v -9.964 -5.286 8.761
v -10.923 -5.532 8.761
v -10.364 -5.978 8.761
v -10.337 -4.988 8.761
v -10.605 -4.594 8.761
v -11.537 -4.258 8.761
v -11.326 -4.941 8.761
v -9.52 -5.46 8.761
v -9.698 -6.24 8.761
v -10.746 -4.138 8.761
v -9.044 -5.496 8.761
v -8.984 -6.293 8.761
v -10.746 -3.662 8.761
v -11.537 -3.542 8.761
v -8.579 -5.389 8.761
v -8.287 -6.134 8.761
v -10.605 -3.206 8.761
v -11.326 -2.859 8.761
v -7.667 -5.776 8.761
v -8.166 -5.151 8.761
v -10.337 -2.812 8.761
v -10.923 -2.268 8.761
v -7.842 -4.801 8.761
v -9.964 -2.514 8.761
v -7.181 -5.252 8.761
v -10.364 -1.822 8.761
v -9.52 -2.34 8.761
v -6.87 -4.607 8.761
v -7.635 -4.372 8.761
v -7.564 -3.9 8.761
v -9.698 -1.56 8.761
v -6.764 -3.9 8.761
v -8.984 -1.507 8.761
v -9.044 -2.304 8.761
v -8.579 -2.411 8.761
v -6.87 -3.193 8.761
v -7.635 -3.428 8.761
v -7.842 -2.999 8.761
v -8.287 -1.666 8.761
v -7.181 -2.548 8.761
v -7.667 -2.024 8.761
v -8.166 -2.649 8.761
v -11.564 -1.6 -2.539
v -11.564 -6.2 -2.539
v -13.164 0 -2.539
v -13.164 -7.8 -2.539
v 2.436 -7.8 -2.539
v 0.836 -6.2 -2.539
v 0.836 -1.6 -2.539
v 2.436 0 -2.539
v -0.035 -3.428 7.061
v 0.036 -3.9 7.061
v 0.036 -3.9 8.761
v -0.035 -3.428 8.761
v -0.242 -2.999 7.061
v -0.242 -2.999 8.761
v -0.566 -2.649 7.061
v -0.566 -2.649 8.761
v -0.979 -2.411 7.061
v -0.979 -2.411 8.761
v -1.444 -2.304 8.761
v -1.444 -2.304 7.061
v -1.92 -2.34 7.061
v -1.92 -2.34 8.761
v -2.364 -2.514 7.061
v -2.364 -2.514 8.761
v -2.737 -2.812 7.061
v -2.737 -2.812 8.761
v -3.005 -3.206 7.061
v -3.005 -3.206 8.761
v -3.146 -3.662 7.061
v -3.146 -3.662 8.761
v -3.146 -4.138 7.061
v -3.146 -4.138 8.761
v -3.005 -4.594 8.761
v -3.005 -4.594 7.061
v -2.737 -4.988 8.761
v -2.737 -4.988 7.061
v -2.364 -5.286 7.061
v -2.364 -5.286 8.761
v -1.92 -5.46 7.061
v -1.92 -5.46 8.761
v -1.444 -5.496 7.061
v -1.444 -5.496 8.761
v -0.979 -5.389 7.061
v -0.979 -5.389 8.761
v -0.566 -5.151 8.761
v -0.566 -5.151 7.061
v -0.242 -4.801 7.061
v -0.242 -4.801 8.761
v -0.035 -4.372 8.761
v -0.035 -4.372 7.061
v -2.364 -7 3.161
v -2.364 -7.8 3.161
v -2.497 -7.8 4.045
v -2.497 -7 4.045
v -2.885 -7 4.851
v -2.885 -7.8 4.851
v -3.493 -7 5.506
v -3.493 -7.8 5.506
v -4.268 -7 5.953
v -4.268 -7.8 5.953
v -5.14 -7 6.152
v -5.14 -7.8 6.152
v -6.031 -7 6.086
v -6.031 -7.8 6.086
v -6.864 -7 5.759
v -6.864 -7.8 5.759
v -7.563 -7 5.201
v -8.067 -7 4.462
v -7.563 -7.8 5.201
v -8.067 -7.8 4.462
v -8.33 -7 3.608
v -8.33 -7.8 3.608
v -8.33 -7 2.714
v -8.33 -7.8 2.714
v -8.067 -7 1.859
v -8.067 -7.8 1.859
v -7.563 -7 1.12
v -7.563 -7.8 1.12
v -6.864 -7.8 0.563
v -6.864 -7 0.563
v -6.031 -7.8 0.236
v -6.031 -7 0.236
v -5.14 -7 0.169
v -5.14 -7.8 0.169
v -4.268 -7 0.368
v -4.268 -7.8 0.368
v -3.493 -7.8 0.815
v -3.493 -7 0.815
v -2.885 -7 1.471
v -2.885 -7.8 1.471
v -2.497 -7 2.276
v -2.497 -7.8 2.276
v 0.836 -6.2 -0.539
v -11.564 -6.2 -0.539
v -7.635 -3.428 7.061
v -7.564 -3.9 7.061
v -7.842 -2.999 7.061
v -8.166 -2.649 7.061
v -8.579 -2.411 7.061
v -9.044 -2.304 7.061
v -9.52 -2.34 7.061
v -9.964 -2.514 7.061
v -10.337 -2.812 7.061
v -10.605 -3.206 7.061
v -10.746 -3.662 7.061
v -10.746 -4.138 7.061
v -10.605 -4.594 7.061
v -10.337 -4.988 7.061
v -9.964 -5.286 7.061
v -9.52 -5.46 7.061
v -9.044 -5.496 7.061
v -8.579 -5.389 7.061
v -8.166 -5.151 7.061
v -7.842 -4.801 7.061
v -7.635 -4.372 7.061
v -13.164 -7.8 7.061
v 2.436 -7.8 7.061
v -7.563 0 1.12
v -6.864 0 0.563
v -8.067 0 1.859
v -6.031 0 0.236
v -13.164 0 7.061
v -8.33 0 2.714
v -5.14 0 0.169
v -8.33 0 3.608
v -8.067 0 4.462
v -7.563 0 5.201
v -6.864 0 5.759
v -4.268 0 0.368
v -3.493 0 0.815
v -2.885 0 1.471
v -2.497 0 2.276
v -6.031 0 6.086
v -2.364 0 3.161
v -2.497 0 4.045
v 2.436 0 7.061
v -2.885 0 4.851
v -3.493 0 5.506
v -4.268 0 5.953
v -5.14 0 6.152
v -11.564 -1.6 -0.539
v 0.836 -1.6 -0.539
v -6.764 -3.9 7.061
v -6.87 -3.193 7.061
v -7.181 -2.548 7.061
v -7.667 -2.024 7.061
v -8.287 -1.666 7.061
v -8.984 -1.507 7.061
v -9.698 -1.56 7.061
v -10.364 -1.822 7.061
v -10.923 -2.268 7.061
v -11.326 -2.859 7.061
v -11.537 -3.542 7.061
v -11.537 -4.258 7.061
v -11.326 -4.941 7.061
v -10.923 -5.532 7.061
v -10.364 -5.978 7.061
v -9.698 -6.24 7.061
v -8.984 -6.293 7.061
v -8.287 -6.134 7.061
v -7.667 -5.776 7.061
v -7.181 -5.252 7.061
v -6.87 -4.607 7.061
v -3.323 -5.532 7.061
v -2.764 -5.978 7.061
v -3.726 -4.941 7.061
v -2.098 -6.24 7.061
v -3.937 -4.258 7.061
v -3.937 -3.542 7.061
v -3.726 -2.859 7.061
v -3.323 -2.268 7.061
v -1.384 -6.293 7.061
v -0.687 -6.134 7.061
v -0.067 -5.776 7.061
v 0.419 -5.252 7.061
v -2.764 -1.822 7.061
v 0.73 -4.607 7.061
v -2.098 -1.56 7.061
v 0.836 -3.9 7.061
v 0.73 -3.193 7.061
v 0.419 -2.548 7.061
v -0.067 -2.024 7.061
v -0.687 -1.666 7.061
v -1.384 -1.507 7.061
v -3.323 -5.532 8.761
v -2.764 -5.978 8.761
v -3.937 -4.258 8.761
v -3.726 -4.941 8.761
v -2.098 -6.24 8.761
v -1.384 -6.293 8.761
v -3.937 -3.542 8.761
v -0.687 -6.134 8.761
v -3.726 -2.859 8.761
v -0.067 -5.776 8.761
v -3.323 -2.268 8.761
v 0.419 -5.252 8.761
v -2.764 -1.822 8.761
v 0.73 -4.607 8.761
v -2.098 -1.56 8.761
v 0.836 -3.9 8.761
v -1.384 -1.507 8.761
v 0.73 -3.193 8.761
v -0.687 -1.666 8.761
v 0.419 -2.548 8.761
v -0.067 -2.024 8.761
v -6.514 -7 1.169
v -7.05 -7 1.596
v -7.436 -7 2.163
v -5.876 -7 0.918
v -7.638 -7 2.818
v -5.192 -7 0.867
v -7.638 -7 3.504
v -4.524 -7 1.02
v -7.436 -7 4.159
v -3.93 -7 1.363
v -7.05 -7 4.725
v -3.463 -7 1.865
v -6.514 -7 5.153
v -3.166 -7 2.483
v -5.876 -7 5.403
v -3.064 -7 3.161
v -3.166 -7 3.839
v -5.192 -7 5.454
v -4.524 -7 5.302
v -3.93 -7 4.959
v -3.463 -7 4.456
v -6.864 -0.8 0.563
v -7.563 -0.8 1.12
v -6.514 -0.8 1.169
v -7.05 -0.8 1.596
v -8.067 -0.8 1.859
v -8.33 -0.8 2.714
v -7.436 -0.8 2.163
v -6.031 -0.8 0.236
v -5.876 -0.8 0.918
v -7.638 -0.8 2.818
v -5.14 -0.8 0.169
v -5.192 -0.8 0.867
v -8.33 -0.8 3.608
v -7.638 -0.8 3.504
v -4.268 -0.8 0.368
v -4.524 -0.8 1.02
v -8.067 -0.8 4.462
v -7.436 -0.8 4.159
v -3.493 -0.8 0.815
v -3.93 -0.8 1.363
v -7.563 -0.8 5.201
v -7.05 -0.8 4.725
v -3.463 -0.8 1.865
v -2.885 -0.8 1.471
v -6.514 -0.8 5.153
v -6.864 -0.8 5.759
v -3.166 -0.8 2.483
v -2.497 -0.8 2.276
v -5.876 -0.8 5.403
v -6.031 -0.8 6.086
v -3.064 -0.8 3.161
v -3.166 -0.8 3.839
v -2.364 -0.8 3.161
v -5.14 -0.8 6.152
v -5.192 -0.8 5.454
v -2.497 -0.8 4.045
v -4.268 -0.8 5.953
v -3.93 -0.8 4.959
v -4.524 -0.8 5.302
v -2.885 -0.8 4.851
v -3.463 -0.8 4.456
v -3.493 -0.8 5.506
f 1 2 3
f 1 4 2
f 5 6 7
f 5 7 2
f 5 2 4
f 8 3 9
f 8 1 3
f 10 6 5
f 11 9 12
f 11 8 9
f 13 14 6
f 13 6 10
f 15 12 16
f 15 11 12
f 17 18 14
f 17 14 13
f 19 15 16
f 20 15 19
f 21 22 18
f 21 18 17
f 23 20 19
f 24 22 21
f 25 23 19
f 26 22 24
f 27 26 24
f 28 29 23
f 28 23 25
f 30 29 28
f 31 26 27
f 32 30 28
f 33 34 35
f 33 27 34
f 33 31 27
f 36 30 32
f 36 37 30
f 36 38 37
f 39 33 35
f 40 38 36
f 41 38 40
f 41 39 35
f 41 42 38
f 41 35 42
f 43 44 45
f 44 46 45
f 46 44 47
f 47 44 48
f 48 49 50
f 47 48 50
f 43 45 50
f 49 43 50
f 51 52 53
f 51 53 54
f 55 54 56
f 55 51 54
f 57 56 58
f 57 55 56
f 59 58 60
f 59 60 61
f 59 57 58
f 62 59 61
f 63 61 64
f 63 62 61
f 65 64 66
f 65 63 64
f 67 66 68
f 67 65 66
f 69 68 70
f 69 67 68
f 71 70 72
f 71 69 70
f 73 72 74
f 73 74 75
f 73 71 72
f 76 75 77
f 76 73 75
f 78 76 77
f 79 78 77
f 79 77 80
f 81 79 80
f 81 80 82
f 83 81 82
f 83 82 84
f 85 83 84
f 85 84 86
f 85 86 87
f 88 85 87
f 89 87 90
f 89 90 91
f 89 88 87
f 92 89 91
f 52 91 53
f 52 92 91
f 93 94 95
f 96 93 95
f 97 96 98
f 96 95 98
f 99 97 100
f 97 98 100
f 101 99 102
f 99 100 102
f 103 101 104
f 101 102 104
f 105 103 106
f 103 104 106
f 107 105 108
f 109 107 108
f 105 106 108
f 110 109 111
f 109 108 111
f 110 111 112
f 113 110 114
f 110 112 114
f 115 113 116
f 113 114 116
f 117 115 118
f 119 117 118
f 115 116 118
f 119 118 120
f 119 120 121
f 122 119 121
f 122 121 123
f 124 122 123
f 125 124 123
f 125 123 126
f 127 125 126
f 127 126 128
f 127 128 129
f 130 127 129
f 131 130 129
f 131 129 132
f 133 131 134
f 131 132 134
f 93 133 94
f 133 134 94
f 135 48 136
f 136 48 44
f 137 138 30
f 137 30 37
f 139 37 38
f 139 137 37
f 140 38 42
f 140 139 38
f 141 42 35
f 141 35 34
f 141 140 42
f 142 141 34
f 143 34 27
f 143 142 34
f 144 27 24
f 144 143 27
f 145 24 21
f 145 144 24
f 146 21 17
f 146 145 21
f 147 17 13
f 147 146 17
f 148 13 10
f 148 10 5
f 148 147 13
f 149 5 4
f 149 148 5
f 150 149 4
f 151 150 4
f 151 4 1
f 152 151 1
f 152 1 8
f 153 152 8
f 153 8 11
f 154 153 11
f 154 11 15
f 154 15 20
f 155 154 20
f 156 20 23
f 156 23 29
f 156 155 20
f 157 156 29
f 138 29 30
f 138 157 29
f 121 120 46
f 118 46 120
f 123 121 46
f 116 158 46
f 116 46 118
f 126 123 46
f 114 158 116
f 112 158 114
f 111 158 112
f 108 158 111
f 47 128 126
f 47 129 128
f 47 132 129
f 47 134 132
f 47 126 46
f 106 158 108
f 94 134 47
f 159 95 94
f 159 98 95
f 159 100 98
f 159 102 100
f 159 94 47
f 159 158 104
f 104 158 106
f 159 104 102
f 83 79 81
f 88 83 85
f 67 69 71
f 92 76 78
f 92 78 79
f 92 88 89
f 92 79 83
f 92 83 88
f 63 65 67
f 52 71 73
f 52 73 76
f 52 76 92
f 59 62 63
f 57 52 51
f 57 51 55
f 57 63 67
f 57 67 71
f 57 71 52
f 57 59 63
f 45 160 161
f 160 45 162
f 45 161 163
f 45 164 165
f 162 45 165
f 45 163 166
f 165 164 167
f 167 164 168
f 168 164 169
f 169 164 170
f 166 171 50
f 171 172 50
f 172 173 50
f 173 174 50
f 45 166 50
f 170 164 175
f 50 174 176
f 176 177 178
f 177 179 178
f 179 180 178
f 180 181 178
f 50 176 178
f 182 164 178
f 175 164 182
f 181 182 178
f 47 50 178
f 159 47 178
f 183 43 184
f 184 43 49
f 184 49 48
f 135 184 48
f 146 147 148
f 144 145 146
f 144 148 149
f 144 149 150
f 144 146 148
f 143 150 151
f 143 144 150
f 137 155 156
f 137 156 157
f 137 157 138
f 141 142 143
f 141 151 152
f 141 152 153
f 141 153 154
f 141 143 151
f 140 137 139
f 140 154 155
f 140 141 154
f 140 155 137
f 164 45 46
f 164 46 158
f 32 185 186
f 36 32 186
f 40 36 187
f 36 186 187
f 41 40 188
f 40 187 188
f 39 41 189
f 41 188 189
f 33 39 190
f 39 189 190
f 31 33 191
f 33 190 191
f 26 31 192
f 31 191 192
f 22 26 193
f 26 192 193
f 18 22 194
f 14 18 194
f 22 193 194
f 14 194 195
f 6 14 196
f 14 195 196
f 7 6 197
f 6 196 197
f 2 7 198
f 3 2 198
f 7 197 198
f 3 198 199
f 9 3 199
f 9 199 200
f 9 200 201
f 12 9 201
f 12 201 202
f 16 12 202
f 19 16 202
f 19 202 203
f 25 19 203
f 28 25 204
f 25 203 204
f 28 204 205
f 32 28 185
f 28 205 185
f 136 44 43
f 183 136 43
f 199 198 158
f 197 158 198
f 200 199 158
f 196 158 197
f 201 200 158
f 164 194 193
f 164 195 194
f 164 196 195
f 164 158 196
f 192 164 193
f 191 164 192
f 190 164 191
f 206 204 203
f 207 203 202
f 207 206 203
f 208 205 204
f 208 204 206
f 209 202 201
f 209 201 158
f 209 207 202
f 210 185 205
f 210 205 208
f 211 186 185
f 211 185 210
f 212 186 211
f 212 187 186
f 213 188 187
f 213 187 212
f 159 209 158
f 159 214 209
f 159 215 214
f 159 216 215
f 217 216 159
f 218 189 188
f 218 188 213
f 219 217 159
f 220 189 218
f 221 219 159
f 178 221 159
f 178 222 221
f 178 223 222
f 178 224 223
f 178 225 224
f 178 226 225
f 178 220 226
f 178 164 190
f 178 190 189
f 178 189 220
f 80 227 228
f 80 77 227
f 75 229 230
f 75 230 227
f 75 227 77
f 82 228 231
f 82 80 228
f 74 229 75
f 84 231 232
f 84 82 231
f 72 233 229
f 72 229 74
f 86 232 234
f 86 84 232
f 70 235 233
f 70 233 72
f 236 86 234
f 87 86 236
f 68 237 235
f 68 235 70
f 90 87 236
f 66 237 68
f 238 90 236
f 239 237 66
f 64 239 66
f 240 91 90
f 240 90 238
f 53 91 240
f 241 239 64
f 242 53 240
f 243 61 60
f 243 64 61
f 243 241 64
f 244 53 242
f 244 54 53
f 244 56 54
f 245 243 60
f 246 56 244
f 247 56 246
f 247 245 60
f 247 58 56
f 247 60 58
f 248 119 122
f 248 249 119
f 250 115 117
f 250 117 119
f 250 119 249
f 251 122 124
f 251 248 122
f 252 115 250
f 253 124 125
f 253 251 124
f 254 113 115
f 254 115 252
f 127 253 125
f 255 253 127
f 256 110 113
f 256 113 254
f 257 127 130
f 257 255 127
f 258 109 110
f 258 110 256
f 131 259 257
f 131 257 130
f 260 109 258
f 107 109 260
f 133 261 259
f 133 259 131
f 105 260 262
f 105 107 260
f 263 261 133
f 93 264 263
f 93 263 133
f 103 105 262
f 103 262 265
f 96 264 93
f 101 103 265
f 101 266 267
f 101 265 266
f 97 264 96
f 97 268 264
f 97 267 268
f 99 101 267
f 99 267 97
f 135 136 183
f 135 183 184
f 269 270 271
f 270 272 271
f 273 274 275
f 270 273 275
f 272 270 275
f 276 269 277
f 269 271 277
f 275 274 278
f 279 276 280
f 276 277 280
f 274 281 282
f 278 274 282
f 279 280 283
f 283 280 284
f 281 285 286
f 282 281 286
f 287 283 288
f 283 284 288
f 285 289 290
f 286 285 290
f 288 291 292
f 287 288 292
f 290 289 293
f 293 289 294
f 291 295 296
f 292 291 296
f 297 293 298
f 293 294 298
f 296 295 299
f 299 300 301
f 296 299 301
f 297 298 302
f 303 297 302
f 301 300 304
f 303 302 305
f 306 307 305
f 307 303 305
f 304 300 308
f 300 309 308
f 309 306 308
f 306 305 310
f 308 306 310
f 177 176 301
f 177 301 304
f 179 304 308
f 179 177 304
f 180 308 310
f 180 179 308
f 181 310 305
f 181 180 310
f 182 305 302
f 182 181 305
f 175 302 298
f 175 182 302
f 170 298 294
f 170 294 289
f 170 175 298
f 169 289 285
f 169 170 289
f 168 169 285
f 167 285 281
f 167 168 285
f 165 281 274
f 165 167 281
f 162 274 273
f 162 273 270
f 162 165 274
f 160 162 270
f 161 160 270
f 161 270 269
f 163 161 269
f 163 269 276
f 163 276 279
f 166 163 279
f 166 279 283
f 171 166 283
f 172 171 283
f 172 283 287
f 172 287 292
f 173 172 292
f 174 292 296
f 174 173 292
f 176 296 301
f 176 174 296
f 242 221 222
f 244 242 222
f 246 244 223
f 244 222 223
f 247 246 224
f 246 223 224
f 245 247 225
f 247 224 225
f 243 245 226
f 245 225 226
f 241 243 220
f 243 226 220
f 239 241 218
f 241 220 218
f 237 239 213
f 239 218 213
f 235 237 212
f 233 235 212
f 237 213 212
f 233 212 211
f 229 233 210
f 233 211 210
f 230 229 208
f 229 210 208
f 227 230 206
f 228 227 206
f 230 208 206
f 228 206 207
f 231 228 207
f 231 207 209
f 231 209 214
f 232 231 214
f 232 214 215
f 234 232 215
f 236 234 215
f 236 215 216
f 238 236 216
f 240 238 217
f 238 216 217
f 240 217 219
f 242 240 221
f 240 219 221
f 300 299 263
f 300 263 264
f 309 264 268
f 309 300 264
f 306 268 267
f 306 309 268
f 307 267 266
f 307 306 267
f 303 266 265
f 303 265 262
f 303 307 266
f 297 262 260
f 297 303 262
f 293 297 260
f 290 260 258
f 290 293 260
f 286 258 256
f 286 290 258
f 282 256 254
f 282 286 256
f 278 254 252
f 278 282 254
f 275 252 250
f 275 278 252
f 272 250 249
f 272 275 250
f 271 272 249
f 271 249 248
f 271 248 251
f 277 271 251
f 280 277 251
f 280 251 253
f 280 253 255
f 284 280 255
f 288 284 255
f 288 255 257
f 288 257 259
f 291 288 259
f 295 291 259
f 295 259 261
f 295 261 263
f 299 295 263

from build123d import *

# Parameters (mm, degrees)
F0_W     = 15.6
F0_H     = 9.6
F0_R     = 3
F0_R_2   = 2.3
F1_DEPTH = 7.8
F2_R     = 2.4
F2_R_2   = 1.6
F3_DEPTH = 1.7
F5_DEPTH = 2
F6_DEPTH = 0.8
F7_R     = 3
F7_R_2   = 2.3
F8_DEPTH = 0.8


with BuildPart() as f1:
    # F0 (on Front) → F1 (new body)
    with BuildSketch(Plane.XZ):
        with Locations((-5.3637987003, 2.2607615549)):
            Rectangle(F0_W, F0_H)
        with Locations((-5.3637987003, 3.1607615549)):
            Circle(F0_R, mode=Mode.SUBTRACT)
        with Locations((-5.3637987003, 3.1607615549)):
            Circle(F0_R)
        with Locations((-5.3637987003, 3.1607615549)):
            Circle(F0_R_2, mode=Mode.SUBTRACT)
    extrude(amount=F1_DEPTH)

    # F2 (on face) → F3 (join)
    with BuildSketch(Plane.XY.offset(7.0607615549)):
        with Locations((-1.5637987003, -3.9)):
            Circle(F2_R)
        with Locations((-1.5637987003, -3.9)):
            Circle(F2_R_2, mode=Mode.SUBTRACT)
        with Locations((-9.1637987003, -3.9)):
            Circle(F2_R)
        with Locations((-9.1637987003, -3.9)):
            Circle(F2_R_2, mode=Mode.SUBTRACT)
    extrude(amount=F3_DEPTH)

    # F4 (on face) → F5 (cut)
    with BuildSketch(Plane(origin=(0, 0, -2.5392384451), x_dir=(1, 0, 0), z_dir=(0, 0, -1))):
        Polygon((-11.5637987003, 6.2), (-11.5637987003, 3.9), (-11.5637987003, 1.6), (-5.3637987003, 1.6), (0.8362012997, 1.6), (0.8362012997, 3.9), (0.8362012997, 6.2), (-5.3637987003, 6.2), align=None)
    extrude(amount=-F5_DEPTH, mode=Mode.SUBTRACT)

    # F0 (on Front) → F6 (cut)
    with BuildSketch(Plane.XZ):
        with Locations((-5.3637987003, 3.1607615549)):
            Circle(F0_R)
        with Locations((-5.3637987003, 3.1607615549)):
            Circle(F0_R_2, mode=Mode.SUBTRACT)
    extrude(amount=F6_DEPTH, mode=Mode.SUBTRACT)

    # F7 (on face) → F8 (cut)
    with BuildSketch(Plane.XZ.offset(7.8)):
        with Locations((-5.3637987003, 3.1607615549)):
            Circle(F7_R)
        with Locations((-5.3637987003, 3.1607615549)):
            Circle(F7_R_2, mode=Mode.SUBTRACT)
    extrude(amount=-F8_DEPTH, mode=Mode.SUBTRACT)


solid = f1.part
